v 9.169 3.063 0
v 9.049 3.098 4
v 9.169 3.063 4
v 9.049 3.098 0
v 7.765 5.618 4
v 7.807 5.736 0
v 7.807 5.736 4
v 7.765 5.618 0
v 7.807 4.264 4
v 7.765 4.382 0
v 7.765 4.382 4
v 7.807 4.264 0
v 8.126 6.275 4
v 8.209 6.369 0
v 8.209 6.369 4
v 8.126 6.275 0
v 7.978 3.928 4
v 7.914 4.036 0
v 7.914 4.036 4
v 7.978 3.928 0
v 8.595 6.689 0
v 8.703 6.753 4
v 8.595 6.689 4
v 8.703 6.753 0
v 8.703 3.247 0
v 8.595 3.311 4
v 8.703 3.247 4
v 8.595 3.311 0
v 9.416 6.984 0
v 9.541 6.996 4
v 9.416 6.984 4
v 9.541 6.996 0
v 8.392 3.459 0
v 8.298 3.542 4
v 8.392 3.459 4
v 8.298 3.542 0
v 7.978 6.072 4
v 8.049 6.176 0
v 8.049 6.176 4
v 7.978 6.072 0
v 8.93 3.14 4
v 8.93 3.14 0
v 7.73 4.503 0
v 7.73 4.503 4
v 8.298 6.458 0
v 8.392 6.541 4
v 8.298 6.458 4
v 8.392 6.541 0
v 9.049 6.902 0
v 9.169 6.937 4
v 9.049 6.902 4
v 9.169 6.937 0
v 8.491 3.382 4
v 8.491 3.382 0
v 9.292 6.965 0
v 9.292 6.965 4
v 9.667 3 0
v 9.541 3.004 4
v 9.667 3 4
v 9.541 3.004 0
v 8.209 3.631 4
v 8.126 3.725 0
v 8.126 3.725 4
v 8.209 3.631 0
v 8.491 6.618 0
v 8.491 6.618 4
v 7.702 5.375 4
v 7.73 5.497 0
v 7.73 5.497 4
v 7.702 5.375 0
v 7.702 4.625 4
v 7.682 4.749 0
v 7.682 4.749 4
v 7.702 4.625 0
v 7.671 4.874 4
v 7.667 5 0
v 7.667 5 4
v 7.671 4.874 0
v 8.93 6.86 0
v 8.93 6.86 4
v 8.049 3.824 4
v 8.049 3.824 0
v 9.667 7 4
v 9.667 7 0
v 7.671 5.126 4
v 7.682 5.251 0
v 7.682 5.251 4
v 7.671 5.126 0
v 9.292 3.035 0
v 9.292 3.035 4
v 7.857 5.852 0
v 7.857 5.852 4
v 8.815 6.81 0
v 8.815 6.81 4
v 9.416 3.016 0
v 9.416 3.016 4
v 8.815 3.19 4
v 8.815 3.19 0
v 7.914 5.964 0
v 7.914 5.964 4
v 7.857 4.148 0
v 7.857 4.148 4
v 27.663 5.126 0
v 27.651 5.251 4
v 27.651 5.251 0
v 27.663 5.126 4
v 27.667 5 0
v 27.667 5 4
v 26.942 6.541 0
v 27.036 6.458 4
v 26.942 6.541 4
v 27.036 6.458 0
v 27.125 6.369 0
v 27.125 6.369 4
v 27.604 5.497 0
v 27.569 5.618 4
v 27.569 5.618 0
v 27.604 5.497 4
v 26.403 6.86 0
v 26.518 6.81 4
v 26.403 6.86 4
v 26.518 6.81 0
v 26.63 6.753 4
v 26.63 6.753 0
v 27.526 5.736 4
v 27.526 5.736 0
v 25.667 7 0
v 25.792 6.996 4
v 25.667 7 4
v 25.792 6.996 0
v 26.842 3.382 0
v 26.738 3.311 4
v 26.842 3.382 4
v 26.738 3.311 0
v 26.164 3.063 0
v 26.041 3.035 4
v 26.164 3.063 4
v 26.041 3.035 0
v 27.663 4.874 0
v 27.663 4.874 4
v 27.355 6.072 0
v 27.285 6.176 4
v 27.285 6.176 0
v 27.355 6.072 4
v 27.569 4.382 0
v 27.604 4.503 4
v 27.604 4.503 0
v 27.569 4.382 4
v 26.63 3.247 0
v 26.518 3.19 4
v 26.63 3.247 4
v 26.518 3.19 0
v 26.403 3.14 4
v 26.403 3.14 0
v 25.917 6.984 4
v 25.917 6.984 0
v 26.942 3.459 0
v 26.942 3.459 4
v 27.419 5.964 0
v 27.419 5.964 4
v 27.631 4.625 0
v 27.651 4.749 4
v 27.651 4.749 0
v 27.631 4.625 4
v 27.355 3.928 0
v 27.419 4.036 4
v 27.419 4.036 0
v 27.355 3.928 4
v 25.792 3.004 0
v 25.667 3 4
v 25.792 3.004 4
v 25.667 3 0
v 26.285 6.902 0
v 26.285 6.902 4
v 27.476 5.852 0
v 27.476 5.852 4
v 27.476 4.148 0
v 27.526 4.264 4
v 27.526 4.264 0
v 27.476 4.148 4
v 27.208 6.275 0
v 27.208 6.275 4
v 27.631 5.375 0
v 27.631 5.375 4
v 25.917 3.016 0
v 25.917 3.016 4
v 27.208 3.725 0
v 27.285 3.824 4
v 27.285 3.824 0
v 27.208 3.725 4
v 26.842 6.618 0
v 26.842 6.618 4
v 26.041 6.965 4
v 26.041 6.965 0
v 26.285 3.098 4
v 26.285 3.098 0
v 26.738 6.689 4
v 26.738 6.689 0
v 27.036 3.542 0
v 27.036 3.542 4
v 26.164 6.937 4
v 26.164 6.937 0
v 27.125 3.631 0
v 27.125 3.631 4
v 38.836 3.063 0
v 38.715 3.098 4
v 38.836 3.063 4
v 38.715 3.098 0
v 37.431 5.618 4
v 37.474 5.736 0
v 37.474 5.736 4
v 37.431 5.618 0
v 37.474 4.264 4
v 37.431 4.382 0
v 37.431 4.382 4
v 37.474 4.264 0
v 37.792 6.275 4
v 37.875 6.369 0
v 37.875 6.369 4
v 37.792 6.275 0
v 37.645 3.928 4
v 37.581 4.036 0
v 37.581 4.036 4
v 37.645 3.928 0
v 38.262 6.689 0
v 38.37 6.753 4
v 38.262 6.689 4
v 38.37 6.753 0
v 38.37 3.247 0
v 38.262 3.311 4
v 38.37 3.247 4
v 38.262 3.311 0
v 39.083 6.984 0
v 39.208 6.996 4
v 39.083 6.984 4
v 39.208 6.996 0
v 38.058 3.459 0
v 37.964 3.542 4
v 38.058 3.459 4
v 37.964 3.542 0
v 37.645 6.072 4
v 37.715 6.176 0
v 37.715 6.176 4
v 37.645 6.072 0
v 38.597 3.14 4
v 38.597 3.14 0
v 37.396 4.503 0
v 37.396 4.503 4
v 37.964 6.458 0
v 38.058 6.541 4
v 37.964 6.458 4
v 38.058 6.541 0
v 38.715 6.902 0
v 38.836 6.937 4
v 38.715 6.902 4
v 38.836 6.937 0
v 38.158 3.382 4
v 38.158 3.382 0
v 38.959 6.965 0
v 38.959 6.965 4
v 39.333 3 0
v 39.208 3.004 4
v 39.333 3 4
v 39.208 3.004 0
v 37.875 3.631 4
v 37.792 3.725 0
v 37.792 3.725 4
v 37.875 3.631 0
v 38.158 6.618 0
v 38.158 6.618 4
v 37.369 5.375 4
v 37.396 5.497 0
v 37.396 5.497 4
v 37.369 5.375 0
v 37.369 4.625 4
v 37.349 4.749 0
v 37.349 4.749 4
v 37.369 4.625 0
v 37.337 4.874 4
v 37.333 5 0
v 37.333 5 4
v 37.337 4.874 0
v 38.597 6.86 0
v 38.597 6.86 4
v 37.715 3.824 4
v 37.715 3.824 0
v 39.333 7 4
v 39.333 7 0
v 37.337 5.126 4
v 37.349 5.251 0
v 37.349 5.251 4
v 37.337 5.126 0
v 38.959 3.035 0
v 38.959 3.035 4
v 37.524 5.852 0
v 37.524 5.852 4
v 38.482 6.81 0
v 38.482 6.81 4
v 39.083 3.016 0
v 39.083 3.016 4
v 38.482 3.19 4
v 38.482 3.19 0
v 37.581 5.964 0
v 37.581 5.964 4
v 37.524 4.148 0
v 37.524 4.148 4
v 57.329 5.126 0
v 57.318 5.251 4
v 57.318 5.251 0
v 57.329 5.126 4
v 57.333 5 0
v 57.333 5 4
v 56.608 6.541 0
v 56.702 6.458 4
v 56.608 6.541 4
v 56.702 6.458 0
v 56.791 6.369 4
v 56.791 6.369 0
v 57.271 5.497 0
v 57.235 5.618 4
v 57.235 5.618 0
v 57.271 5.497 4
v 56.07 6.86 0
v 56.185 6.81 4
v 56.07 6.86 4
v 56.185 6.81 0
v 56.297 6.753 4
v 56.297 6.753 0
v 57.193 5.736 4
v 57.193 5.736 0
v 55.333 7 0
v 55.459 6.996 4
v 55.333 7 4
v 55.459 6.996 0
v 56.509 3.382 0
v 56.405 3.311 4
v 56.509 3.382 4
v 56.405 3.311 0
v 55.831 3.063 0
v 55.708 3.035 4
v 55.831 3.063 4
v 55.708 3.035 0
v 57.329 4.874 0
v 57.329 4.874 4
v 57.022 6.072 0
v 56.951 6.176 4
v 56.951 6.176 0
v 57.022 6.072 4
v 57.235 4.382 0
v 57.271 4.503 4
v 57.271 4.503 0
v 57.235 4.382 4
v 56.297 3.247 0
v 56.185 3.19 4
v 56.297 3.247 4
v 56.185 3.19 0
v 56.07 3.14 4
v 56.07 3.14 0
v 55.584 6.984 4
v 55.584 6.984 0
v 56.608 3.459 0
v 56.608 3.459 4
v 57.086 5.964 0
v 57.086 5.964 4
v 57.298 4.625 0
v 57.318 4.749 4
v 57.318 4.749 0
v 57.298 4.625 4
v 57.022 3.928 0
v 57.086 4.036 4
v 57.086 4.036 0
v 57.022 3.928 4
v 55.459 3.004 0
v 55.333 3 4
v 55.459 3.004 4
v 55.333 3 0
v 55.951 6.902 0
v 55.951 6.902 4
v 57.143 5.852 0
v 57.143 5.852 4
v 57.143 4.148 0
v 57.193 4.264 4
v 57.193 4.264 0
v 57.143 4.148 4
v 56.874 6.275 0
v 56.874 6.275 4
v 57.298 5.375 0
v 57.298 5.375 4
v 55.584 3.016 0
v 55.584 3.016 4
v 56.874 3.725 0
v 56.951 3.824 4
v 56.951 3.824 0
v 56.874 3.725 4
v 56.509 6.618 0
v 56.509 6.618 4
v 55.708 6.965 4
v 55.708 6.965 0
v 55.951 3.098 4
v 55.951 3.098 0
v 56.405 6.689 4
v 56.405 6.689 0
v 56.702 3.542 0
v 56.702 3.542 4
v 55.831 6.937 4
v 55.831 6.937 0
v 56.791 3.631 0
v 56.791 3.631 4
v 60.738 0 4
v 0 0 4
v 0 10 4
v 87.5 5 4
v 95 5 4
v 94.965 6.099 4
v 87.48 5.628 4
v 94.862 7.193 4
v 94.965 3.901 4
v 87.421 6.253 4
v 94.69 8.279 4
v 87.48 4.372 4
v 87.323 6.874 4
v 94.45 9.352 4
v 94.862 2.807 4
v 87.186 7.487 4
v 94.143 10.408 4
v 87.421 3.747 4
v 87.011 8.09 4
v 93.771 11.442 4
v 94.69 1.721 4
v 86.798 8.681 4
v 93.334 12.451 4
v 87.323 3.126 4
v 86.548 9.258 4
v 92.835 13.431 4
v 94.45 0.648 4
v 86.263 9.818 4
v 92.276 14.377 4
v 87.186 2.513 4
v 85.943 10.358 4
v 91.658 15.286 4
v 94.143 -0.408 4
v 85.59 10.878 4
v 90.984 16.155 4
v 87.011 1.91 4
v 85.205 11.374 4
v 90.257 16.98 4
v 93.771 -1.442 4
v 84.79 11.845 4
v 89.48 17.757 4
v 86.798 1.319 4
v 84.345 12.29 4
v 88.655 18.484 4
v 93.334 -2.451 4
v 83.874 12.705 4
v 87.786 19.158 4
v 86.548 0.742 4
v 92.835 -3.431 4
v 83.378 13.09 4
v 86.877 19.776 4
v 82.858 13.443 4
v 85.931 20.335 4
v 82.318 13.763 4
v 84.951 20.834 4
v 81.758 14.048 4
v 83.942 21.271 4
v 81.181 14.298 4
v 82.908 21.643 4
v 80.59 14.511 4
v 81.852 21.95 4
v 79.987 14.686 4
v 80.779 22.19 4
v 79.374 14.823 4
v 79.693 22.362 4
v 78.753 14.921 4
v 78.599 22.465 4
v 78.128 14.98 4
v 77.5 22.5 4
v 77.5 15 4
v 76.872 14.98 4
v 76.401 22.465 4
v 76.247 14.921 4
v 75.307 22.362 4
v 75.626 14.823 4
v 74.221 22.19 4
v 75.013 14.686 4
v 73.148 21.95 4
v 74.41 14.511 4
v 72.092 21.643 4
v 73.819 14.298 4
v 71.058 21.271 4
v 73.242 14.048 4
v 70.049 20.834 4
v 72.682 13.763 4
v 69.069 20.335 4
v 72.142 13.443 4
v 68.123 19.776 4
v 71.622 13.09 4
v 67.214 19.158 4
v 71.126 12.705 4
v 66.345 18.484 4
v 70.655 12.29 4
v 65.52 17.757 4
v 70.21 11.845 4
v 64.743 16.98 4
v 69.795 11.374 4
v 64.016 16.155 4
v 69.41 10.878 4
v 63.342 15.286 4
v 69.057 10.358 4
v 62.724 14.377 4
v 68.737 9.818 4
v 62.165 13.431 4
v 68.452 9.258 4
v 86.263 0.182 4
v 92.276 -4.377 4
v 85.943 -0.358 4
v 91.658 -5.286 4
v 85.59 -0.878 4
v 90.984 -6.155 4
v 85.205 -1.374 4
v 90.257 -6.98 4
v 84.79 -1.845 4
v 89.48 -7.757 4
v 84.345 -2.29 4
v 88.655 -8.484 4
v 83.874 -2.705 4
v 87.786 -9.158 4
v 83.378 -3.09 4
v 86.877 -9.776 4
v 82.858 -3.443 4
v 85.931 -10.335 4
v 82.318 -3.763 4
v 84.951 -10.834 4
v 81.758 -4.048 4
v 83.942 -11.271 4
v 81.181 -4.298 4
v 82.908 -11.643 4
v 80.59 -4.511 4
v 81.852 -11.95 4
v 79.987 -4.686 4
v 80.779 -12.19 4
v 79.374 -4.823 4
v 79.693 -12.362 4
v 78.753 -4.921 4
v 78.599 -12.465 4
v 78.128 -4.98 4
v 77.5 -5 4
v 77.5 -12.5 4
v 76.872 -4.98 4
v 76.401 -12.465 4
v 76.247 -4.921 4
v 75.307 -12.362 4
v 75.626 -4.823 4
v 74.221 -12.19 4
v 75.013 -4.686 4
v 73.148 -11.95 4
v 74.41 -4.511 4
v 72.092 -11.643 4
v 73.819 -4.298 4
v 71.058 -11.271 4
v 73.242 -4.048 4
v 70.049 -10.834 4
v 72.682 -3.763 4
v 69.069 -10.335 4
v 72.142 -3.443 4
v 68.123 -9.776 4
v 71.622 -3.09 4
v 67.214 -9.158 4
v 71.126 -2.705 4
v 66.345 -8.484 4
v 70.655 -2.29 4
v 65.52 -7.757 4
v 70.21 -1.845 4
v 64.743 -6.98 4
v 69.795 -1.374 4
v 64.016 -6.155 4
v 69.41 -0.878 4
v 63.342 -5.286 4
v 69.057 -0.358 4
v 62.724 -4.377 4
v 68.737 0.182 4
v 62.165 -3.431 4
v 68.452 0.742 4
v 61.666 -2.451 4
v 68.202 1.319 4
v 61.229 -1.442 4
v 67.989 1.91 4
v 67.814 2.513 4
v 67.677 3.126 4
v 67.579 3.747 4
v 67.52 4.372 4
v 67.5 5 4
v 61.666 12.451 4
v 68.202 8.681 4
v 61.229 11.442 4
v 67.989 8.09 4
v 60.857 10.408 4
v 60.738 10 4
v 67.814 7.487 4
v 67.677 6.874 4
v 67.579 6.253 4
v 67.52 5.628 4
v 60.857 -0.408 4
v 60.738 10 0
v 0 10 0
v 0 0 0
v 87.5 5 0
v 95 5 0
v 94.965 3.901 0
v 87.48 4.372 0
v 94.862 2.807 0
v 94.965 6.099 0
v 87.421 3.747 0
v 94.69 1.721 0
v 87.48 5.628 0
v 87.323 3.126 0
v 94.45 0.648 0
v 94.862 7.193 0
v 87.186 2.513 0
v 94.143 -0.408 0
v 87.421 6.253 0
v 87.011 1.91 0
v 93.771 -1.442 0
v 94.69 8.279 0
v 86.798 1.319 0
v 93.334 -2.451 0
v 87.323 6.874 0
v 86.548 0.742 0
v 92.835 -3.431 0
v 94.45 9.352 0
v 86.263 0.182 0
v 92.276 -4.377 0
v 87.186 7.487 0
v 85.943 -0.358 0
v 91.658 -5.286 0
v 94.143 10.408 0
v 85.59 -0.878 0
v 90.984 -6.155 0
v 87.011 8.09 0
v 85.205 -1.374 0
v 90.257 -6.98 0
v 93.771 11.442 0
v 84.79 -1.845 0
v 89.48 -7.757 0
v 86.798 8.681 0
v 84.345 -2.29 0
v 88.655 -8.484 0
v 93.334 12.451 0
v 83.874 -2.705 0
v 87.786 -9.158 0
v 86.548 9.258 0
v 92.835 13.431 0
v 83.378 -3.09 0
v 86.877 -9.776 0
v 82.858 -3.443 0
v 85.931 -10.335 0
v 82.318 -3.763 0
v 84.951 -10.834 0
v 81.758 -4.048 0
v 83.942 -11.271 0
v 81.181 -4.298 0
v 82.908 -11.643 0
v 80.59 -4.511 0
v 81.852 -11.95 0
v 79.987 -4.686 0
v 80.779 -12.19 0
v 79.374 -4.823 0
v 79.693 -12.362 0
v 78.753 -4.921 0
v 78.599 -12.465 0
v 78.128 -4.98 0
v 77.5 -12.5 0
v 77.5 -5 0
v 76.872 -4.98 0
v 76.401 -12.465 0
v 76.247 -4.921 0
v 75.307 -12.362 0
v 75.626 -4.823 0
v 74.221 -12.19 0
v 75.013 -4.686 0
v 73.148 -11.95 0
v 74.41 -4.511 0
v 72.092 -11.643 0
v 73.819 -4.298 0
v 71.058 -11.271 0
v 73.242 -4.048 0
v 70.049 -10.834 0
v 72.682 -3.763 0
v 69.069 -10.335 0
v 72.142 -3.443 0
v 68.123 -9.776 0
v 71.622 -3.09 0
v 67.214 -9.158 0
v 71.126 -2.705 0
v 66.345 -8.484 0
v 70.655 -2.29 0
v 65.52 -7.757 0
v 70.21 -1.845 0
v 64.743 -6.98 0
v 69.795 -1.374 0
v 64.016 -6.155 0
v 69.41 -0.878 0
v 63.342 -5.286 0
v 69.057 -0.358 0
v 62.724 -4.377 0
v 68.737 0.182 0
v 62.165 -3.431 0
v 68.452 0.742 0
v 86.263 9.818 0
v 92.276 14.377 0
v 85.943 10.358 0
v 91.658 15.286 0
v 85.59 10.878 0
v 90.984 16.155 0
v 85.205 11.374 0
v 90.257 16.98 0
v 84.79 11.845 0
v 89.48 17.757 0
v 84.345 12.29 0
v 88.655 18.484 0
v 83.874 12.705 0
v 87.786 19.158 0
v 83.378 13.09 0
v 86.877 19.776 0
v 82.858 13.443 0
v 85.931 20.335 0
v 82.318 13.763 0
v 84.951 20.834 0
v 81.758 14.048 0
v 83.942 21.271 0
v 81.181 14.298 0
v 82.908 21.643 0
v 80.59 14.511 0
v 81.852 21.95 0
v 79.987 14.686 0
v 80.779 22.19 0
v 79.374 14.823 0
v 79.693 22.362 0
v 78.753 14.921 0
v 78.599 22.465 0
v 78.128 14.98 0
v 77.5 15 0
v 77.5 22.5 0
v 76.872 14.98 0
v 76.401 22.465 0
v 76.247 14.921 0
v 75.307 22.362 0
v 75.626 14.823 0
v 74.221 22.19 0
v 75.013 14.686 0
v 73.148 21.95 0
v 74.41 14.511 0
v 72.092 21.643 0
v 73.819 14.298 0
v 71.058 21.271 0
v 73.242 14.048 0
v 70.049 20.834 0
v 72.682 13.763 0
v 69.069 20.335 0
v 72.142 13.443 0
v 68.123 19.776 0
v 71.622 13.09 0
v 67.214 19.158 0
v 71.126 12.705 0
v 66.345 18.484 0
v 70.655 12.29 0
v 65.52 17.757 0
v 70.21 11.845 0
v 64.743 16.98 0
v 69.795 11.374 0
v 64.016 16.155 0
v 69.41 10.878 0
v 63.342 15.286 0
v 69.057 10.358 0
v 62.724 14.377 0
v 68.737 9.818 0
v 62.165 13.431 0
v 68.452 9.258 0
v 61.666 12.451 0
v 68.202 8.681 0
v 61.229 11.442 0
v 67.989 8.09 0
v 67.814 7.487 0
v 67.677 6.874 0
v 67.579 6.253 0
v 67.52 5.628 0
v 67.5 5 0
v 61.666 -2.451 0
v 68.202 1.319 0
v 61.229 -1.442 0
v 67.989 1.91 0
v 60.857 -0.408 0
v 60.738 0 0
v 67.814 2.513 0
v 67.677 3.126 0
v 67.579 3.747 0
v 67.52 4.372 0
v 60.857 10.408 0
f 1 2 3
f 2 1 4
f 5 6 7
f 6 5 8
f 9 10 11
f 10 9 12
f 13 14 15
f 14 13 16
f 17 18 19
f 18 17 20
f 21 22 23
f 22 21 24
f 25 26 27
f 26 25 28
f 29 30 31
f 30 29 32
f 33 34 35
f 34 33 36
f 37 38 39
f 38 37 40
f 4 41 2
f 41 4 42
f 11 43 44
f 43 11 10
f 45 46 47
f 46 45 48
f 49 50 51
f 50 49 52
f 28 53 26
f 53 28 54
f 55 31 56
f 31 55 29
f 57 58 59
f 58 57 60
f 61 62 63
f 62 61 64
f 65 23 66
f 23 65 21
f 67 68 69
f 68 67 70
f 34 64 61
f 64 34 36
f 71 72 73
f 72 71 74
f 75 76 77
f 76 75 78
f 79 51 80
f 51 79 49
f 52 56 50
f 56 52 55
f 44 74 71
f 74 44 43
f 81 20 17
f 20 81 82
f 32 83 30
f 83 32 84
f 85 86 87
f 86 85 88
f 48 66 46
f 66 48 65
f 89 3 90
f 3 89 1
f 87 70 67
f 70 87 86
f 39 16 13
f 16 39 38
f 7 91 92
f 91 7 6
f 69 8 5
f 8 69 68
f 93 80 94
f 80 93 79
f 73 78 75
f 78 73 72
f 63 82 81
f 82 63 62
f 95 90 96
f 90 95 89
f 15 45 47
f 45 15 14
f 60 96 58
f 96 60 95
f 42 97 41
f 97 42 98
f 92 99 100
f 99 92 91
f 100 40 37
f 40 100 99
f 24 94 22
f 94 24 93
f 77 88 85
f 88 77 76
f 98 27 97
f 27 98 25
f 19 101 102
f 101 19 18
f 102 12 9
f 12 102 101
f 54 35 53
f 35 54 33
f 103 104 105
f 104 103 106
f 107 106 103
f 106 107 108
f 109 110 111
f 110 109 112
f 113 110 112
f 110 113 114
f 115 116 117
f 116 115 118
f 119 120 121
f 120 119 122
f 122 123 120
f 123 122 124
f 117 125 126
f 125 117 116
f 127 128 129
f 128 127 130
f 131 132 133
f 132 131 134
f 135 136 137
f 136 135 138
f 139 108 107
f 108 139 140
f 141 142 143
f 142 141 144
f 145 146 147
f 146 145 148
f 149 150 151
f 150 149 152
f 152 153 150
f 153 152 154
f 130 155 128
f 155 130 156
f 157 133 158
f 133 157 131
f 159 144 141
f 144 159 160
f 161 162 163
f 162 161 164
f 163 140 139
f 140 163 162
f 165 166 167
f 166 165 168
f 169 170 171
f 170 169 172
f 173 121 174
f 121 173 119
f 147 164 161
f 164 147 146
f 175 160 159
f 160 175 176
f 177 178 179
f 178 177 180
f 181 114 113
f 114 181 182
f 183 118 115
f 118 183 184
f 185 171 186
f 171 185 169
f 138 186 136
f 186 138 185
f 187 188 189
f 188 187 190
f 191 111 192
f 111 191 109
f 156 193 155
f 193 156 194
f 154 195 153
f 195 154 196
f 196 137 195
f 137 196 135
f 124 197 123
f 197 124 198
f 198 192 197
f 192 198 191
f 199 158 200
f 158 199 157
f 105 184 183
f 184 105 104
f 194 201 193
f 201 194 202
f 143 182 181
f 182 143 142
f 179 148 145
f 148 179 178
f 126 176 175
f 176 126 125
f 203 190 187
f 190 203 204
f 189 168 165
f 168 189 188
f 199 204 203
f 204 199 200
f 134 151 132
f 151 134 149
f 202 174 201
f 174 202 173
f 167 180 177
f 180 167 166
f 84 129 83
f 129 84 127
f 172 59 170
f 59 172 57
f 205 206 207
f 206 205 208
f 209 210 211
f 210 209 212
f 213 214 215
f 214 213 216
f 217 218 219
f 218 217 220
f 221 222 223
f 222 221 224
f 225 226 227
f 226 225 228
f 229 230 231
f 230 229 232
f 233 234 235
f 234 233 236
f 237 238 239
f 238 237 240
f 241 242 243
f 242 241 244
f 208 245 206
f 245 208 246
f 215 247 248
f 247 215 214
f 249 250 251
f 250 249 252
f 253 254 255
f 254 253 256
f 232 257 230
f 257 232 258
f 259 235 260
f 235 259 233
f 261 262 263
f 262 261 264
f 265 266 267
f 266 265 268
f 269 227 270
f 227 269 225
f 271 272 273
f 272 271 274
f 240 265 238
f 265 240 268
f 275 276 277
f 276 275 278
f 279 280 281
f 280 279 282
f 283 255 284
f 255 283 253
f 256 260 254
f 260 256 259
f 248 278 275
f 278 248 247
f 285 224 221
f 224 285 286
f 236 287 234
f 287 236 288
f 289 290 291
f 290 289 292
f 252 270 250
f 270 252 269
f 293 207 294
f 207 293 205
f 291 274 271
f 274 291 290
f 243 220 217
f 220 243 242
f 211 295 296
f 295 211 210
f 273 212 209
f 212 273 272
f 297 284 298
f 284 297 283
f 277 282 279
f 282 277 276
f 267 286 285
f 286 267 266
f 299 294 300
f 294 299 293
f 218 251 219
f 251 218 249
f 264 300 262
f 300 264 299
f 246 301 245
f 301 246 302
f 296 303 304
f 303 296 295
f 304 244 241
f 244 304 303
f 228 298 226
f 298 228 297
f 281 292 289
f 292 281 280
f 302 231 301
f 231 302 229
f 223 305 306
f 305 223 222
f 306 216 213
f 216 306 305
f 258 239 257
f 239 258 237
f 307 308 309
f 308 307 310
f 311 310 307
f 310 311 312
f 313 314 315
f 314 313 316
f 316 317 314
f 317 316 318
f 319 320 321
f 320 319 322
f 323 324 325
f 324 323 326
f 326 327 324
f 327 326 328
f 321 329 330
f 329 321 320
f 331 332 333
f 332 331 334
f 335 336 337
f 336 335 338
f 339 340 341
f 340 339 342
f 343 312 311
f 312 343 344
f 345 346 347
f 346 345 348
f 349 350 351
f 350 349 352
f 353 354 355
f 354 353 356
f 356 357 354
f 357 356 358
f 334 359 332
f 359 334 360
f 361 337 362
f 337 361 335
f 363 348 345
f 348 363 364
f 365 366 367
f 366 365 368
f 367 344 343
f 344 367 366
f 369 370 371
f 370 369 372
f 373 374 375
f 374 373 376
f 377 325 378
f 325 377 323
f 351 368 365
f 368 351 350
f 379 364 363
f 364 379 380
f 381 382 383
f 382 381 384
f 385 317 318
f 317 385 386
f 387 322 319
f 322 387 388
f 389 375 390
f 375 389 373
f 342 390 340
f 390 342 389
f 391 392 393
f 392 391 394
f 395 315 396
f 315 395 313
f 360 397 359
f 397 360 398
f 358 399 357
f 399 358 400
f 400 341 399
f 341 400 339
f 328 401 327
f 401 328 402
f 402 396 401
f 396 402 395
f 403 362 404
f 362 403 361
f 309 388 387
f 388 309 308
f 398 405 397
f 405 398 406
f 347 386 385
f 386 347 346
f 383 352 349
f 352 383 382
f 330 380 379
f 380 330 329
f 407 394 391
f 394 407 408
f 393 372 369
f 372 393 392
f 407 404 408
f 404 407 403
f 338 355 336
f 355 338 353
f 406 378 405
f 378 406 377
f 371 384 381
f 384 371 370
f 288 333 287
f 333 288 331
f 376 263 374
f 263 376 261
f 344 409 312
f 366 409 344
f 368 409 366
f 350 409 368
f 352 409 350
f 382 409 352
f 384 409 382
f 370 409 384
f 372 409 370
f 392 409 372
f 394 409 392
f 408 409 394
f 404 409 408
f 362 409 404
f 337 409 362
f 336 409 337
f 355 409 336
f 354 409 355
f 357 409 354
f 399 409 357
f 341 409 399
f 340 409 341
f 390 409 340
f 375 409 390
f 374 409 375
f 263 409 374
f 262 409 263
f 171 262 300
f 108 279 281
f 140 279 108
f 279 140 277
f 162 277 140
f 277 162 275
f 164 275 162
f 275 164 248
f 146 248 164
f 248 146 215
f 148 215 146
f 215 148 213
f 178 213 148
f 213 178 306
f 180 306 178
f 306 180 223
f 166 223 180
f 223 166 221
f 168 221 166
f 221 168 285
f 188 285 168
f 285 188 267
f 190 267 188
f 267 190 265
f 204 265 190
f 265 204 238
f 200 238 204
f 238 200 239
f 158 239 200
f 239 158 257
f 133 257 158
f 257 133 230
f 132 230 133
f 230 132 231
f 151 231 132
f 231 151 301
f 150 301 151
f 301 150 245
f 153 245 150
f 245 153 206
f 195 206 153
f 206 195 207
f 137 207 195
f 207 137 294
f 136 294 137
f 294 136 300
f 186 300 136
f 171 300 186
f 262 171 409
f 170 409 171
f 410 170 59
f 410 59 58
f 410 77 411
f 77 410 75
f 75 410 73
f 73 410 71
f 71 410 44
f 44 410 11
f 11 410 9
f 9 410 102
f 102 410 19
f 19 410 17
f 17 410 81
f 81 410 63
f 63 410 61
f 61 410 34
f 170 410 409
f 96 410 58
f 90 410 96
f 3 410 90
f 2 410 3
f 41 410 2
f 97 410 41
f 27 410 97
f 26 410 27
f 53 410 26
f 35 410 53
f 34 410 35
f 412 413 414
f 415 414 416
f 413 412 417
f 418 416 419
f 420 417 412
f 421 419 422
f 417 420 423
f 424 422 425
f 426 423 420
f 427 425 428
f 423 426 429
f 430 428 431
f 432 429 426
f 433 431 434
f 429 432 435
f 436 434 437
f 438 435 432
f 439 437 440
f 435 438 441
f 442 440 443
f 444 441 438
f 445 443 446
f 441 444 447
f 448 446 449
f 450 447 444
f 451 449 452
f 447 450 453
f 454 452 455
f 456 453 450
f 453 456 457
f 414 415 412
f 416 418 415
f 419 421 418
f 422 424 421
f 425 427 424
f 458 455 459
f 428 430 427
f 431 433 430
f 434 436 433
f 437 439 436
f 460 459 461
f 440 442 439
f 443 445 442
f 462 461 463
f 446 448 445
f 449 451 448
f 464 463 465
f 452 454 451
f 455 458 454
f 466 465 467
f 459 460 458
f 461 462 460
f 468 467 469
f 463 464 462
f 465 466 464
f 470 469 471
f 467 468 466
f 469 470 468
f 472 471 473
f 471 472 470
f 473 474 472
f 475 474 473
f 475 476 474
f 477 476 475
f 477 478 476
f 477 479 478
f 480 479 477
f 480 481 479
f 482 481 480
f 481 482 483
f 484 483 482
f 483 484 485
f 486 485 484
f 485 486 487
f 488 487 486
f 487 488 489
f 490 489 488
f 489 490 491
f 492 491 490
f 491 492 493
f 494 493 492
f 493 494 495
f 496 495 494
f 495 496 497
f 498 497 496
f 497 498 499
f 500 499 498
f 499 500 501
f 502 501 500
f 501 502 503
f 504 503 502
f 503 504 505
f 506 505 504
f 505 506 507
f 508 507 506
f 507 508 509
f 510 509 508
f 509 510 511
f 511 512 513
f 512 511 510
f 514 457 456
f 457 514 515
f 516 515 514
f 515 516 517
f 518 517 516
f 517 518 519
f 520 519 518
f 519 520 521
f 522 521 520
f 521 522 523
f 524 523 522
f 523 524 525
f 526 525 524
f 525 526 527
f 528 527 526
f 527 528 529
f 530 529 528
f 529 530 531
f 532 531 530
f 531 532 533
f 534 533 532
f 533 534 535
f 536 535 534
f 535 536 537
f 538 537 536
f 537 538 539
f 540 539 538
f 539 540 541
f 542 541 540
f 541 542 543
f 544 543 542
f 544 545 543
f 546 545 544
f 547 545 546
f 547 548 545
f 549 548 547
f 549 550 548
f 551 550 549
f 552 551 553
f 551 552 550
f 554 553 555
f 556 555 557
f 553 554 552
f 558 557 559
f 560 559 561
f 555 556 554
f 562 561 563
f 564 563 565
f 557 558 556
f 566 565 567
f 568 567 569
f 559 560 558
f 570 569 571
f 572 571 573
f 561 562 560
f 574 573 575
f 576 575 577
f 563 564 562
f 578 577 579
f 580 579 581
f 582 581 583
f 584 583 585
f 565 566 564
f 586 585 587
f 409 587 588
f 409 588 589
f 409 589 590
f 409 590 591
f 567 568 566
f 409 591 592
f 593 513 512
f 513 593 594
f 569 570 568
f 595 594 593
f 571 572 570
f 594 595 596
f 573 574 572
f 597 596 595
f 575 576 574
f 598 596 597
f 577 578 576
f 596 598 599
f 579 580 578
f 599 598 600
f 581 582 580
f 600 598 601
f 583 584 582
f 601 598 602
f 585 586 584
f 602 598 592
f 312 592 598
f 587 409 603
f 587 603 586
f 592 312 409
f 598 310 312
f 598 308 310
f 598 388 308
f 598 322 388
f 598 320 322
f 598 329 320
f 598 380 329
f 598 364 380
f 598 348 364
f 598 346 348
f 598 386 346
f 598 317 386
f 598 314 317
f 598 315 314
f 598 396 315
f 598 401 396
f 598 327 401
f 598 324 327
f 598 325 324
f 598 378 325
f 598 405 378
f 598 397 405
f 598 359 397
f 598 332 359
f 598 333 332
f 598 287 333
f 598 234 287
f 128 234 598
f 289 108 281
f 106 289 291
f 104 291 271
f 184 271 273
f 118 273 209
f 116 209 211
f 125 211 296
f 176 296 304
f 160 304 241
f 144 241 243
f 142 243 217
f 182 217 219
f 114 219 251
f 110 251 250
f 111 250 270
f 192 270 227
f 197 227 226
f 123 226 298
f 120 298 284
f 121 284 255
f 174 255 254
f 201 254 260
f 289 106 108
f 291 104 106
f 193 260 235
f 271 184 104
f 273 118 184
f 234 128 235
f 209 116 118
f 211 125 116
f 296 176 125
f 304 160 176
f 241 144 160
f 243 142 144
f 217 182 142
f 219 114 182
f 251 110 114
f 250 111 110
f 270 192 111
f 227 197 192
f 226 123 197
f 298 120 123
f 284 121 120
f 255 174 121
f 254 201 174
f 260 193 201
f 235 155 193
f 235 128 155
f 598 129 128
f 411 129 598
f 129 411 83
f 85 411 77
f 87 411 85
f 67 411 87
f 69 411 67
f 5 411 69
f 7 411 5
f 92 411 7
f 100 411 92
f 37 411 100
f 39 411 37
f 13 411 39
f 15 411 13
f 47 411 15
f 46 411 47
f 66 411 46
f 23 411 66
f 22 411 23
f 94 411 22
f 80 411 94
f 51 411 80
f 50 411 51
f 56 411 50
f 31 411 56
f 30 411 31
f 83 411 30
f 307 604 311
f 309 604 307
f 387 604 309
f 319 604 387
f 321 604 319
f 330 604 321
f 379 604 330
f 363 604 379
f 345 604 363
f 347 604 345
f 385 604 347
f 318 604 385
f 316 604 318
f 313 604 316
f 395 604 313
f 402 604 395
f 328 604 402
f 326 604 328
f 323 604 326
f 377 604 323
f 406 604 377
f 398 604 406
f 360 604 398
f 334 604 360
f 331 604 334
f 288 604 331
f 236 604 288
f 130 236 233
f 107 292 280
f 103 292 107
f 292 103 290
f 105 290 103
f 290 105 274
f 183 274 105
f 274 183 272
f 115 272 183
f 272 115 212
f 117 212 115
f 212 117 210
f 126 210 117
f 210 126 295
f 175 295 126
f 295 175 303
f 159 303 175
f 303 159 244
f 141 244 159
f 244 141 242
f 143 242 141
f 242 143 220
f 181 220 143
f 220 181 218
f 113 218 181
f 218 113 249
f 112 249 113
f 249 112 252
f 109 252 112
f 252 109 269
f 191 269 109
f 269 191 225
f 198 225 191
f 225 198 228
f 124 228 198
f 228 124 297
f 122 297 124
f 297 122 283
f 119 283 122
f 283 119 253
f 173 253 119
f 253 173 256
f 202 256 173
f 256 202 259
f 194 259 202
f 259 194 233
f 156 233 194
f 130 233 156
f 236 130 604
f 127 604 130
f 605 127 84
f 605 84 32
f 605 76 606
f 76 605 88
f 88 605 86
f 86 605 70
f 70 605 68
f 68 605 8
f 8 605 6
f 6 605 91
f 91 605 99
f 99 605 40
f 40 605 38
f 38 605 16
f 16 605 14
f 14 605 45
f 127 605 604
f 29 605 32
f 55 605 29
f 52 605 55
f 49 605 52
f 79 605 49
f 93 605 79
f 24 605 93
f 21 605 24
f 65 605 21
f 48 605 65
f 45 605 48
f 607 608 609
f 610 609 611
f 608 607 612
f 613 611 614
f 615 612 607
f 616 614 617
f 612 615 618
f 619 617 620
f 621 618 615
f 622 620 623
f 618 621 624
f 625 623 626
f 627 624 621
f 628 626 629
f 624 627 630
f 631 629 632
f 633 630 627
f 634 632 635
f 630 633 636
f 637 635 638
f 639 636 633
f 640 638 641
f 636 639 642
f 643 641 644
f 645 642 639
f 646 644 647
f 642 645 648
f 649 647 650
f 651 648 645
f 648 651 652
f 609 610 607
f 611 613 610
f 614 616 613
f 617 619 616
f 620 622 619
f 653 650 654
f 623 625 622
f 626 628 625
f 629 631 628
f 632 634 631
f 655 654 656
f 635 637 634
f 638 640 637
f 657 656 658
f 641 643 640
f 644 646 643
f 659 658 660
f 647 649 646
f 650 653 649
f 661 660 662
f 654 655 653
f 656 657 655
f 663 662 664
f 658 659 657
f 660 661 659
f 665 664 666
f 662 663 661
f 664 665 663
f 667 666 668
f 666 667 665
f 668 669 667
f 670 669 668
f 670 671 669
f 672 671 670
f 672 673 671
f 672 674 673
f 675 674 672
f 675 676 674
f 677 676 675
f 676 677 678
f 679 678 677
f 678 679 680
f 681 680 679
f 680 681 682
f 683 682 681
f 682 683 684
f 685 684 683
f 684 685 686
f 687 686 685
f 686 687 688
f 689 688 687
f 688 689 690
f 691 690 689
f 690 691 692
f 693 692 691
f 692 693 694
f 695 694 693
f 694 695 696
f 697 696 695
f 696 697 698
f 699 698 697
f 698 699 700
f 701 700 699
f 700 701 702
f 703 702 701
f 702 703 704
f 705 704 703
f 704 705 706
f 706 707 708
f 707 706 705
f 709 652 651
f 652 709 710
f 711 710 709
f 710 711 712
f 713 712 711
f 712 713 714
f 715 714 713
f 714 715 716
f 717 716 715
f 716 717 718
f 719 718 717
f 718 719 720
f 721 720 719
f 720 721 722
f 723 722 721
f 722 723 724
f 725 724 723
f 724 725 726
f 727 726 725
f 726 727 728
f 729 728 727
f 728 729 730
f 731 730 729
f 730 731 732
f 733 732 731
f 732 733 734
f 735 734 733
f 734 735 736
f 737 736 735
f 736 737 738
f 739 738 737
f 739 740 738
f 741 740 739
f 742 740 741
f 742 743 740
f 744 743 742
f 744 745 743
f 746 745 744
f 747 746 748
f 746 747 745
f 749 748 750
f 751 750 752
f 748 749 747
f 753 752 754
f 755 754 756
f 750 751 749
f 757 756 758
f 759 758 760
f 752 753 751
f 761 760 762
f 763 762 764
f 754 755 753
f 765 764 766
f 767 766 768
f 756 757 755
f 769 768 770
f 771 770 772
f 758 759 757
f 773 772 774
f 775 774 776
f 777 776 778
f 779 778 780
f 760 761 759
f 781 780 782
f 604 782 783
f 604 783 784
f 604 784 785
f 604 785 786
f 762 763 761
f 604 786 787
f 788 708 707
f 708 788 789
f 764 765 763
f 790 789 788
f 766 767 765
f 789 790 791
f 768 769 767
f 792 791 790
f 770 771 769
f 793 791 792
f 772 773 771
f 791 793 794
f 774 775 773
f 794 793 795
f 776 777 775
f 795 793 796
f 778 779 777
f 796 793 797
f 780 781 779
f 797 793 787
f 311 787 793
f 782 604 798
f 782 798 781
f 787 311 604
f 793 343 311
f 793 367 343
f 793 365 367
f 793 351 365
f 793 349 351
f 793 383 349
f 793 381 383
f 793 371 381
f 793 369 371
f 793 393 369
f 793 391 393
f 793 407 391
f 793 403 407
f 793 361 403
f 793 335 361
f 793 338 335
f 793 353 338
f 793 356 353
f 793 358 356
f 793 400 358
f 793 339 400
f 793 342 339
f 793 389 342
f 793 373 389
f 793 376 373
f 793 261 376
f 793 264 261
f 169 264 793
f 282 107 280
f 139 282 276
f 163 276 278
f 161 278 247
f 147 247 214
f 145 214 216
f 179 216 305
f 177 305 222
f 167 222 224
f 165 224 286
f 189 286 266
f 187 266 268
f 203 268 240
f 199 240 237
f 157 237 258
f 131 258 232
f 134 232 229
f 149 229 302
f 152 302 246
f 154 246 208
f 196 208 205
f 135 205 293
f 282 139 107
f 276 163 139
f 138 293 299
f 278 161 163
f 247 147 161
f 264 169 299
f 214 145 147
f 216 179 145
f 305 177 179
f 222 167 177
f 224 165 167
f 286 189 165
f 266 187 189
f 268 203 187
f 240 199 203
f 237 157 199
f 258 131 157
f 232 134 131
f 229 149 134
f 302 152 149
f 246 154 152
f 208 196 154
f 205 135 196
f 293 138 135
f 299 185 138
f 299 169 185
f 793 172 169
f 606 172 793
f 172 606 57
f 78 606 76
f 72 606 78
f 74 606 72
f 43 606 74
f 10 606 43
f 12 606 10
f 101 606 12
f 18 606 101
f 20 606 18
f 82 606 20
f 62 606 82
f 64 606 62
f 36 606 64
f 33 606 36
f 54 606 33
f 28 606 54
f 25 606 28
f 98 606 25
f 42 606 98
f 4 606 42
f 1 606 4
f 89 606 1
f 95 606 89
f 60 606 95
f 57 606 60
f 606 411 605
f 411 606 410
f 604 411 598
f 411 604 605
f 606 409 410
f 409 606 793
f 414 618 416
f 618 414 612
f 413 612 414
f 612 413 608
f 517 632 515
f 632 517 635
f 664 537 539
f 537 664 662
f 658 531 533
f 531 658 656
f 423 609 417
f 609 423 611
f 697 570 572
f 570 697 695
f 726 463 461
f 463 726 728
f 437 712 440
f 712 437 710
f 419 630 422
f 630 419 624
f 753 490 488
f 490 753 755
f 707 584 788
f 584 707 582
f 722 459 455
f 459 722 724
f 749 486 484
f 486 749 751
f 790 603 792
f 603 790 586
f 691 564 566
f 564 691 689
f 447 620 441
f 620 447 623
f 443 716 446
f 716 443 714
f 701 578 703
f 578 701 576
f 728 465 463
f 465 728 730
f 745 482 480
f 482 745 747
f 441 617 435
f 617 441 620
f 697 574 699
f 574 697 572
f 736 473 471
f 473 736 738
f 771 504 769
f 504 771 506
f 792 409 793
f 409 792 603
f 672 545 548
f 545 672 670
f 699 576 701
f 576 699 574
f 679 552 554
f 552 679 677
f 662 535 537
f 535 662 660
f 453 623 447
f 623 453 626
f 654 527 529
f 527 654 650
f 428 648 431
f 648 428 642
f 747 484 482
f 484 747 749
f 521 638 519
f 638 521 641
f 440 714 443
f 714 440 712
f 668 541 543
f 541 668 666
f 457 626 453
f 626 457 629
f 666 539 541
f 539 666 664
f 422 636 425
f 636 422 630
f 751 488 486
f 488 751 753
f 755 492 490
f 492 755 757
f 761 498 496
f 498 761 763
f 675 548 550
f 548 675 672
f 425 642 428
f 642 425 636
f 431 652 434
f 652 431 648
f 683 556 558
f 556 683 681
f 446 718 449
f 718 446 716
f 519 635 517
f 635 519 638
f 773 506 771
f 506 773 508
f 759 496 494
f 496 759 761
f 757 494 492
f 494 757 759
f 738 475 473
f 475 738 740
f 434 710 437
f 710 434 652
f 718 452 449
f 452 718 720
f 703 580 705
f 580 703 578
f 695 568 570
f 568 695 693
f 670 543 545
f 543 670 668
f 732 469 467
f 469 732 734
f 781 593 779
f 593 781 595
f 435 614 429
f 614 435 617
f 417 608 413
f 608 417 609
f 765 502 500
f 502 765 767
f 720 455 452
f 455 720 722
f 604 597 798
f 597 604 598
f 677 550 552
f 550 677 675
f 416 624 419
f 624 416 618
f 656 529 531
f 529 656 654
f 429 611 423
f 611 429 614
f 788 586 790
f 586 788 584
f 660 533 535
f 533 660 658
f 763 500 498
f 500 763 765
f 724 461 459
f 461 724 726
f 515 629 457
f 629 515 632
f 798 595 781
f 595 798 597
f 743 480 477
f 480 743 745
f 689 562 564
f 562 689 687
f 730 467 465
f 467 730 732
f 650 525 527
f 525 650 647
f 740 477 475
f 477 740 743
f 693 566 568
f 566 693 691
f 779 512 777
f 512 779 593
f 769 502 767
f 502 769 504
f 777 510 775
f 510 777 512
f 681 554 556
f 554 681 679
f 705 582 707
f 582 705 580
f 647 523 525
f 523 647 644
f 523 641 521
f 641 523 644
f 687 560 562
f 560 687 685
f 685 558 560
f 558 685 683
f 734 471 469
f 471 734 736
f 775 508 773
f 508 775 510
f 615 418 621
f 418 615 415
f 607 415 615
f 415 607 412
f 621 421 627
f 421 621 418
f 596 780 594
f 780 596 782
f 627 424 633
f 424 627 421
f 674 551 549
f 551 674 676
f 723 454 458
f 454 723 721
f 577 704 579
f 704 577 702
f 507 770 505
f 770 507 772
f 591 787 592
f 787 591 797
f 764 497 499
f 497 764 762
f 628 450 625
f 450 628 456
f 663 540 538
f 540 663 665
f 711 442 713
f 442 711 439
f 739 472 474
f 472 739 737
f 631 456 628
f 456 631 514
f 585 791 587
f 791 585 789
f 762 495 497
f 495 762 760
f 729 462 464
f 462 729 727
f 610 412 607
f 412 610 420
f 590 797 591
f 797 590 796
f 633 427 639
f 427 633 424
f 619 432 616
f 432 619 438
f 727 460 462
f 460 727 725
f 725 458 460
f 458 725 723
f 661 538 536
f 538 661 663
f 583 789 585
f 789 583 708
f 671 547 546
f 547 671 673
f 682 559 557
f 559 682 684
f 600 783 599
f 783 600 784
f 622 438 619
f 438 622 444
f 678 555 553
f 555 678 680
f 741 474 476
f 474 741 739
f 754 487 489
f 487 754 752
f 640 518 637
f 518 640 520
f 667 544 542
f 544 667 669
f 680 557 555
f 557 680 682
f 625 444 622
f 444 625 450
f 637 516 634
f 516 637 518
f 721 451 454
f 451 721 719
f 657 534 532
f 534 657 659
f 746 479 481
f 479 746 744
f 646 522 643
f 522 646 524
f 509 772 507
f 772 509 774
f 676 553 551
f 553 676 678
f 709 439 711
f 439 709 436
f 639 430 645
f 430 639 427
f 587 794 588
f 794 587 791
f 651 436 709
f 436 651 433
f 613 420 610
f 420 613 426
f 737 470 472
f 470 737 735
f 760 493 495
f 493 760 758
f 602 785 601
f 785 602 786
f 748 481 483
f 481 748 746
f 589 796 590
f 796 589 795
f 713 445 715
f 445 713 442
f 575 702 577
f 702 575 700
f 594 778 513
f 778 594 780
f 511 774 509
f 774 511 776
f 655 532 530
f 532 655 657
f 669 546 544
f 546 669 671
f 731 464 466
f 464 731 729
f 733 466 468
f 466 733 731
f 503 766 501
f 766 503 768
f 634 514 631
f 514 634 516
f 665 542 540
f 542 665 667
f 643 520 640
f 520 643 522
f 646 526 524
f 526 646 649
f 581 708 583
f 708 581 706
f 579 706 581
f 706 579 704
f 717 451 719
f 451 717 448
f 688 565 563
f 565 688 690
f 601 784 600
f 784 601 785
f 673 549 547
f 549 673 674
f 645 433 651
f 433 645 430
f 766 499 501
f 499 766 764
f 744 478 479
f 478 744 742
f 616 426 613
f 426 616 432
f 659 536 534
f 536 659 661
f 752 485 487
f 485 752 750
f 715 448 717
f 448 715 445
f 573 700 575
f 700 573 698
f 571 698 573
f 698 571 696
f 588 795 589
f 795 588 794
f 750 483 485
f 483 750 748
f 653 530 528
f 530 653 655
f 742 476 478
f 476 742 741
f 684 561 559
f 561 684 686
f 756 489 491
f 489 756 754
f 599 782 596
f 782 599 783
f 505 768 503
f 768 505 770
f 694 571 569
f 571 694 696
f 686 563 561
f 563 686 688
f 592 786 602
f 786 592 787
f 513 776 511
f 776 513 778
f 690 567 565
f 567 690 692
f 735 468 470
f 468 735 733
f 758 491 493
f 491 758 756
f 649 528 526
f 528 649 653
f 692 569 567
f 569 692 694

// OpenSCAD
adapter_fanmount_length=65; //Overall length of the piece that attaches to the Wanhao i3 (or clone) fan mount.
adapter_fanmount_width=10;  //Width of fan mount
adapter_fanmount_depth=4;  //Thickness of the fan mount
adapter_fanmount_hole_length=20;  //Length of the two holes for the fan mount.  Making it longer allows for adjustability.
adapter_fanmount_hole_width=4;  //Width of the fan mount holes.
probe_mount_diameter_inner=20; //Probe diameter + 1-2mm
probe_mount_diameter_outer=35; //Outside dimeter of the piece the probe mounts to.
probe_depth=4;  //Thickness of the probe mount.
adapter_probe_overlap=5; //The overlap between the fan mount side and the probe mount side.
adapter_probe_offset=0; //The vertical offset between the fan mount and probe mount.  Allows for the probe to mount higher or lower than the fan mount.
$fn=100;

adapter();

module adapter() {
union() {
    fanmount();
    translate([adapter_fanmount_length+probe_mount_diameter_outer/2-adapter_probe_overlap,adapter_fanmount_width/2,adapter_probe_offset])
    probemount();
    translate([adapter_fanmount_length-adapter_probe_overlap,0,0])
    cube([adapter_probe_overlap,adapter_fanmount_width,adapter_fanmount_depth+adapter_probe_offset]);
}
}

module probemount() {
difference() {
cylinder(d=probe_mount_diameter_outer,h=probe_depth);
translate([0,0,-0.1])
cylinder(d=probe_mount_diameter_inner,h=probe_depth+0.2);
}
}

module fanmount() {
difference() {
cube([adapter_fanmount_length,adapter_fanmount_width,adapter_fanmount_depth]);
translate([adapter_fanmount_length/3-adapter_fanmount_hole_width,adapter_fanmount_width/2,-0.1])
fanmount_holes();
translate([adapter_fanmount_length*2/3+adapter_fanmount_hole_width,adapter_fanmount_width/2,-0.1])
fanmount_holes();
}
}

module fanmount_holes() {
translate([-(adapter_fanmount_hole_length-adapter_fanmount_hole_width)/2,0,0]) {
cylinder(d=adapter_fanmount_hole_width,h=adapter_fanmount_depth+0.2);
translate([adapter_fanmount_hole_length-adapter_fanmount_hole_width,0,0])
cylinder(d=adapter_fanmount_hole_width,h=adapter_fanmount_depth+0.2);
translate([0,-adapter_fanmount_hole_width/2,0])
cube([adapter_fanmount_hole_length-adapter_fanmount_hole_width,adapter_fanmount_hole_width,adapter_fanmount_depth+0.2]);
}
}
